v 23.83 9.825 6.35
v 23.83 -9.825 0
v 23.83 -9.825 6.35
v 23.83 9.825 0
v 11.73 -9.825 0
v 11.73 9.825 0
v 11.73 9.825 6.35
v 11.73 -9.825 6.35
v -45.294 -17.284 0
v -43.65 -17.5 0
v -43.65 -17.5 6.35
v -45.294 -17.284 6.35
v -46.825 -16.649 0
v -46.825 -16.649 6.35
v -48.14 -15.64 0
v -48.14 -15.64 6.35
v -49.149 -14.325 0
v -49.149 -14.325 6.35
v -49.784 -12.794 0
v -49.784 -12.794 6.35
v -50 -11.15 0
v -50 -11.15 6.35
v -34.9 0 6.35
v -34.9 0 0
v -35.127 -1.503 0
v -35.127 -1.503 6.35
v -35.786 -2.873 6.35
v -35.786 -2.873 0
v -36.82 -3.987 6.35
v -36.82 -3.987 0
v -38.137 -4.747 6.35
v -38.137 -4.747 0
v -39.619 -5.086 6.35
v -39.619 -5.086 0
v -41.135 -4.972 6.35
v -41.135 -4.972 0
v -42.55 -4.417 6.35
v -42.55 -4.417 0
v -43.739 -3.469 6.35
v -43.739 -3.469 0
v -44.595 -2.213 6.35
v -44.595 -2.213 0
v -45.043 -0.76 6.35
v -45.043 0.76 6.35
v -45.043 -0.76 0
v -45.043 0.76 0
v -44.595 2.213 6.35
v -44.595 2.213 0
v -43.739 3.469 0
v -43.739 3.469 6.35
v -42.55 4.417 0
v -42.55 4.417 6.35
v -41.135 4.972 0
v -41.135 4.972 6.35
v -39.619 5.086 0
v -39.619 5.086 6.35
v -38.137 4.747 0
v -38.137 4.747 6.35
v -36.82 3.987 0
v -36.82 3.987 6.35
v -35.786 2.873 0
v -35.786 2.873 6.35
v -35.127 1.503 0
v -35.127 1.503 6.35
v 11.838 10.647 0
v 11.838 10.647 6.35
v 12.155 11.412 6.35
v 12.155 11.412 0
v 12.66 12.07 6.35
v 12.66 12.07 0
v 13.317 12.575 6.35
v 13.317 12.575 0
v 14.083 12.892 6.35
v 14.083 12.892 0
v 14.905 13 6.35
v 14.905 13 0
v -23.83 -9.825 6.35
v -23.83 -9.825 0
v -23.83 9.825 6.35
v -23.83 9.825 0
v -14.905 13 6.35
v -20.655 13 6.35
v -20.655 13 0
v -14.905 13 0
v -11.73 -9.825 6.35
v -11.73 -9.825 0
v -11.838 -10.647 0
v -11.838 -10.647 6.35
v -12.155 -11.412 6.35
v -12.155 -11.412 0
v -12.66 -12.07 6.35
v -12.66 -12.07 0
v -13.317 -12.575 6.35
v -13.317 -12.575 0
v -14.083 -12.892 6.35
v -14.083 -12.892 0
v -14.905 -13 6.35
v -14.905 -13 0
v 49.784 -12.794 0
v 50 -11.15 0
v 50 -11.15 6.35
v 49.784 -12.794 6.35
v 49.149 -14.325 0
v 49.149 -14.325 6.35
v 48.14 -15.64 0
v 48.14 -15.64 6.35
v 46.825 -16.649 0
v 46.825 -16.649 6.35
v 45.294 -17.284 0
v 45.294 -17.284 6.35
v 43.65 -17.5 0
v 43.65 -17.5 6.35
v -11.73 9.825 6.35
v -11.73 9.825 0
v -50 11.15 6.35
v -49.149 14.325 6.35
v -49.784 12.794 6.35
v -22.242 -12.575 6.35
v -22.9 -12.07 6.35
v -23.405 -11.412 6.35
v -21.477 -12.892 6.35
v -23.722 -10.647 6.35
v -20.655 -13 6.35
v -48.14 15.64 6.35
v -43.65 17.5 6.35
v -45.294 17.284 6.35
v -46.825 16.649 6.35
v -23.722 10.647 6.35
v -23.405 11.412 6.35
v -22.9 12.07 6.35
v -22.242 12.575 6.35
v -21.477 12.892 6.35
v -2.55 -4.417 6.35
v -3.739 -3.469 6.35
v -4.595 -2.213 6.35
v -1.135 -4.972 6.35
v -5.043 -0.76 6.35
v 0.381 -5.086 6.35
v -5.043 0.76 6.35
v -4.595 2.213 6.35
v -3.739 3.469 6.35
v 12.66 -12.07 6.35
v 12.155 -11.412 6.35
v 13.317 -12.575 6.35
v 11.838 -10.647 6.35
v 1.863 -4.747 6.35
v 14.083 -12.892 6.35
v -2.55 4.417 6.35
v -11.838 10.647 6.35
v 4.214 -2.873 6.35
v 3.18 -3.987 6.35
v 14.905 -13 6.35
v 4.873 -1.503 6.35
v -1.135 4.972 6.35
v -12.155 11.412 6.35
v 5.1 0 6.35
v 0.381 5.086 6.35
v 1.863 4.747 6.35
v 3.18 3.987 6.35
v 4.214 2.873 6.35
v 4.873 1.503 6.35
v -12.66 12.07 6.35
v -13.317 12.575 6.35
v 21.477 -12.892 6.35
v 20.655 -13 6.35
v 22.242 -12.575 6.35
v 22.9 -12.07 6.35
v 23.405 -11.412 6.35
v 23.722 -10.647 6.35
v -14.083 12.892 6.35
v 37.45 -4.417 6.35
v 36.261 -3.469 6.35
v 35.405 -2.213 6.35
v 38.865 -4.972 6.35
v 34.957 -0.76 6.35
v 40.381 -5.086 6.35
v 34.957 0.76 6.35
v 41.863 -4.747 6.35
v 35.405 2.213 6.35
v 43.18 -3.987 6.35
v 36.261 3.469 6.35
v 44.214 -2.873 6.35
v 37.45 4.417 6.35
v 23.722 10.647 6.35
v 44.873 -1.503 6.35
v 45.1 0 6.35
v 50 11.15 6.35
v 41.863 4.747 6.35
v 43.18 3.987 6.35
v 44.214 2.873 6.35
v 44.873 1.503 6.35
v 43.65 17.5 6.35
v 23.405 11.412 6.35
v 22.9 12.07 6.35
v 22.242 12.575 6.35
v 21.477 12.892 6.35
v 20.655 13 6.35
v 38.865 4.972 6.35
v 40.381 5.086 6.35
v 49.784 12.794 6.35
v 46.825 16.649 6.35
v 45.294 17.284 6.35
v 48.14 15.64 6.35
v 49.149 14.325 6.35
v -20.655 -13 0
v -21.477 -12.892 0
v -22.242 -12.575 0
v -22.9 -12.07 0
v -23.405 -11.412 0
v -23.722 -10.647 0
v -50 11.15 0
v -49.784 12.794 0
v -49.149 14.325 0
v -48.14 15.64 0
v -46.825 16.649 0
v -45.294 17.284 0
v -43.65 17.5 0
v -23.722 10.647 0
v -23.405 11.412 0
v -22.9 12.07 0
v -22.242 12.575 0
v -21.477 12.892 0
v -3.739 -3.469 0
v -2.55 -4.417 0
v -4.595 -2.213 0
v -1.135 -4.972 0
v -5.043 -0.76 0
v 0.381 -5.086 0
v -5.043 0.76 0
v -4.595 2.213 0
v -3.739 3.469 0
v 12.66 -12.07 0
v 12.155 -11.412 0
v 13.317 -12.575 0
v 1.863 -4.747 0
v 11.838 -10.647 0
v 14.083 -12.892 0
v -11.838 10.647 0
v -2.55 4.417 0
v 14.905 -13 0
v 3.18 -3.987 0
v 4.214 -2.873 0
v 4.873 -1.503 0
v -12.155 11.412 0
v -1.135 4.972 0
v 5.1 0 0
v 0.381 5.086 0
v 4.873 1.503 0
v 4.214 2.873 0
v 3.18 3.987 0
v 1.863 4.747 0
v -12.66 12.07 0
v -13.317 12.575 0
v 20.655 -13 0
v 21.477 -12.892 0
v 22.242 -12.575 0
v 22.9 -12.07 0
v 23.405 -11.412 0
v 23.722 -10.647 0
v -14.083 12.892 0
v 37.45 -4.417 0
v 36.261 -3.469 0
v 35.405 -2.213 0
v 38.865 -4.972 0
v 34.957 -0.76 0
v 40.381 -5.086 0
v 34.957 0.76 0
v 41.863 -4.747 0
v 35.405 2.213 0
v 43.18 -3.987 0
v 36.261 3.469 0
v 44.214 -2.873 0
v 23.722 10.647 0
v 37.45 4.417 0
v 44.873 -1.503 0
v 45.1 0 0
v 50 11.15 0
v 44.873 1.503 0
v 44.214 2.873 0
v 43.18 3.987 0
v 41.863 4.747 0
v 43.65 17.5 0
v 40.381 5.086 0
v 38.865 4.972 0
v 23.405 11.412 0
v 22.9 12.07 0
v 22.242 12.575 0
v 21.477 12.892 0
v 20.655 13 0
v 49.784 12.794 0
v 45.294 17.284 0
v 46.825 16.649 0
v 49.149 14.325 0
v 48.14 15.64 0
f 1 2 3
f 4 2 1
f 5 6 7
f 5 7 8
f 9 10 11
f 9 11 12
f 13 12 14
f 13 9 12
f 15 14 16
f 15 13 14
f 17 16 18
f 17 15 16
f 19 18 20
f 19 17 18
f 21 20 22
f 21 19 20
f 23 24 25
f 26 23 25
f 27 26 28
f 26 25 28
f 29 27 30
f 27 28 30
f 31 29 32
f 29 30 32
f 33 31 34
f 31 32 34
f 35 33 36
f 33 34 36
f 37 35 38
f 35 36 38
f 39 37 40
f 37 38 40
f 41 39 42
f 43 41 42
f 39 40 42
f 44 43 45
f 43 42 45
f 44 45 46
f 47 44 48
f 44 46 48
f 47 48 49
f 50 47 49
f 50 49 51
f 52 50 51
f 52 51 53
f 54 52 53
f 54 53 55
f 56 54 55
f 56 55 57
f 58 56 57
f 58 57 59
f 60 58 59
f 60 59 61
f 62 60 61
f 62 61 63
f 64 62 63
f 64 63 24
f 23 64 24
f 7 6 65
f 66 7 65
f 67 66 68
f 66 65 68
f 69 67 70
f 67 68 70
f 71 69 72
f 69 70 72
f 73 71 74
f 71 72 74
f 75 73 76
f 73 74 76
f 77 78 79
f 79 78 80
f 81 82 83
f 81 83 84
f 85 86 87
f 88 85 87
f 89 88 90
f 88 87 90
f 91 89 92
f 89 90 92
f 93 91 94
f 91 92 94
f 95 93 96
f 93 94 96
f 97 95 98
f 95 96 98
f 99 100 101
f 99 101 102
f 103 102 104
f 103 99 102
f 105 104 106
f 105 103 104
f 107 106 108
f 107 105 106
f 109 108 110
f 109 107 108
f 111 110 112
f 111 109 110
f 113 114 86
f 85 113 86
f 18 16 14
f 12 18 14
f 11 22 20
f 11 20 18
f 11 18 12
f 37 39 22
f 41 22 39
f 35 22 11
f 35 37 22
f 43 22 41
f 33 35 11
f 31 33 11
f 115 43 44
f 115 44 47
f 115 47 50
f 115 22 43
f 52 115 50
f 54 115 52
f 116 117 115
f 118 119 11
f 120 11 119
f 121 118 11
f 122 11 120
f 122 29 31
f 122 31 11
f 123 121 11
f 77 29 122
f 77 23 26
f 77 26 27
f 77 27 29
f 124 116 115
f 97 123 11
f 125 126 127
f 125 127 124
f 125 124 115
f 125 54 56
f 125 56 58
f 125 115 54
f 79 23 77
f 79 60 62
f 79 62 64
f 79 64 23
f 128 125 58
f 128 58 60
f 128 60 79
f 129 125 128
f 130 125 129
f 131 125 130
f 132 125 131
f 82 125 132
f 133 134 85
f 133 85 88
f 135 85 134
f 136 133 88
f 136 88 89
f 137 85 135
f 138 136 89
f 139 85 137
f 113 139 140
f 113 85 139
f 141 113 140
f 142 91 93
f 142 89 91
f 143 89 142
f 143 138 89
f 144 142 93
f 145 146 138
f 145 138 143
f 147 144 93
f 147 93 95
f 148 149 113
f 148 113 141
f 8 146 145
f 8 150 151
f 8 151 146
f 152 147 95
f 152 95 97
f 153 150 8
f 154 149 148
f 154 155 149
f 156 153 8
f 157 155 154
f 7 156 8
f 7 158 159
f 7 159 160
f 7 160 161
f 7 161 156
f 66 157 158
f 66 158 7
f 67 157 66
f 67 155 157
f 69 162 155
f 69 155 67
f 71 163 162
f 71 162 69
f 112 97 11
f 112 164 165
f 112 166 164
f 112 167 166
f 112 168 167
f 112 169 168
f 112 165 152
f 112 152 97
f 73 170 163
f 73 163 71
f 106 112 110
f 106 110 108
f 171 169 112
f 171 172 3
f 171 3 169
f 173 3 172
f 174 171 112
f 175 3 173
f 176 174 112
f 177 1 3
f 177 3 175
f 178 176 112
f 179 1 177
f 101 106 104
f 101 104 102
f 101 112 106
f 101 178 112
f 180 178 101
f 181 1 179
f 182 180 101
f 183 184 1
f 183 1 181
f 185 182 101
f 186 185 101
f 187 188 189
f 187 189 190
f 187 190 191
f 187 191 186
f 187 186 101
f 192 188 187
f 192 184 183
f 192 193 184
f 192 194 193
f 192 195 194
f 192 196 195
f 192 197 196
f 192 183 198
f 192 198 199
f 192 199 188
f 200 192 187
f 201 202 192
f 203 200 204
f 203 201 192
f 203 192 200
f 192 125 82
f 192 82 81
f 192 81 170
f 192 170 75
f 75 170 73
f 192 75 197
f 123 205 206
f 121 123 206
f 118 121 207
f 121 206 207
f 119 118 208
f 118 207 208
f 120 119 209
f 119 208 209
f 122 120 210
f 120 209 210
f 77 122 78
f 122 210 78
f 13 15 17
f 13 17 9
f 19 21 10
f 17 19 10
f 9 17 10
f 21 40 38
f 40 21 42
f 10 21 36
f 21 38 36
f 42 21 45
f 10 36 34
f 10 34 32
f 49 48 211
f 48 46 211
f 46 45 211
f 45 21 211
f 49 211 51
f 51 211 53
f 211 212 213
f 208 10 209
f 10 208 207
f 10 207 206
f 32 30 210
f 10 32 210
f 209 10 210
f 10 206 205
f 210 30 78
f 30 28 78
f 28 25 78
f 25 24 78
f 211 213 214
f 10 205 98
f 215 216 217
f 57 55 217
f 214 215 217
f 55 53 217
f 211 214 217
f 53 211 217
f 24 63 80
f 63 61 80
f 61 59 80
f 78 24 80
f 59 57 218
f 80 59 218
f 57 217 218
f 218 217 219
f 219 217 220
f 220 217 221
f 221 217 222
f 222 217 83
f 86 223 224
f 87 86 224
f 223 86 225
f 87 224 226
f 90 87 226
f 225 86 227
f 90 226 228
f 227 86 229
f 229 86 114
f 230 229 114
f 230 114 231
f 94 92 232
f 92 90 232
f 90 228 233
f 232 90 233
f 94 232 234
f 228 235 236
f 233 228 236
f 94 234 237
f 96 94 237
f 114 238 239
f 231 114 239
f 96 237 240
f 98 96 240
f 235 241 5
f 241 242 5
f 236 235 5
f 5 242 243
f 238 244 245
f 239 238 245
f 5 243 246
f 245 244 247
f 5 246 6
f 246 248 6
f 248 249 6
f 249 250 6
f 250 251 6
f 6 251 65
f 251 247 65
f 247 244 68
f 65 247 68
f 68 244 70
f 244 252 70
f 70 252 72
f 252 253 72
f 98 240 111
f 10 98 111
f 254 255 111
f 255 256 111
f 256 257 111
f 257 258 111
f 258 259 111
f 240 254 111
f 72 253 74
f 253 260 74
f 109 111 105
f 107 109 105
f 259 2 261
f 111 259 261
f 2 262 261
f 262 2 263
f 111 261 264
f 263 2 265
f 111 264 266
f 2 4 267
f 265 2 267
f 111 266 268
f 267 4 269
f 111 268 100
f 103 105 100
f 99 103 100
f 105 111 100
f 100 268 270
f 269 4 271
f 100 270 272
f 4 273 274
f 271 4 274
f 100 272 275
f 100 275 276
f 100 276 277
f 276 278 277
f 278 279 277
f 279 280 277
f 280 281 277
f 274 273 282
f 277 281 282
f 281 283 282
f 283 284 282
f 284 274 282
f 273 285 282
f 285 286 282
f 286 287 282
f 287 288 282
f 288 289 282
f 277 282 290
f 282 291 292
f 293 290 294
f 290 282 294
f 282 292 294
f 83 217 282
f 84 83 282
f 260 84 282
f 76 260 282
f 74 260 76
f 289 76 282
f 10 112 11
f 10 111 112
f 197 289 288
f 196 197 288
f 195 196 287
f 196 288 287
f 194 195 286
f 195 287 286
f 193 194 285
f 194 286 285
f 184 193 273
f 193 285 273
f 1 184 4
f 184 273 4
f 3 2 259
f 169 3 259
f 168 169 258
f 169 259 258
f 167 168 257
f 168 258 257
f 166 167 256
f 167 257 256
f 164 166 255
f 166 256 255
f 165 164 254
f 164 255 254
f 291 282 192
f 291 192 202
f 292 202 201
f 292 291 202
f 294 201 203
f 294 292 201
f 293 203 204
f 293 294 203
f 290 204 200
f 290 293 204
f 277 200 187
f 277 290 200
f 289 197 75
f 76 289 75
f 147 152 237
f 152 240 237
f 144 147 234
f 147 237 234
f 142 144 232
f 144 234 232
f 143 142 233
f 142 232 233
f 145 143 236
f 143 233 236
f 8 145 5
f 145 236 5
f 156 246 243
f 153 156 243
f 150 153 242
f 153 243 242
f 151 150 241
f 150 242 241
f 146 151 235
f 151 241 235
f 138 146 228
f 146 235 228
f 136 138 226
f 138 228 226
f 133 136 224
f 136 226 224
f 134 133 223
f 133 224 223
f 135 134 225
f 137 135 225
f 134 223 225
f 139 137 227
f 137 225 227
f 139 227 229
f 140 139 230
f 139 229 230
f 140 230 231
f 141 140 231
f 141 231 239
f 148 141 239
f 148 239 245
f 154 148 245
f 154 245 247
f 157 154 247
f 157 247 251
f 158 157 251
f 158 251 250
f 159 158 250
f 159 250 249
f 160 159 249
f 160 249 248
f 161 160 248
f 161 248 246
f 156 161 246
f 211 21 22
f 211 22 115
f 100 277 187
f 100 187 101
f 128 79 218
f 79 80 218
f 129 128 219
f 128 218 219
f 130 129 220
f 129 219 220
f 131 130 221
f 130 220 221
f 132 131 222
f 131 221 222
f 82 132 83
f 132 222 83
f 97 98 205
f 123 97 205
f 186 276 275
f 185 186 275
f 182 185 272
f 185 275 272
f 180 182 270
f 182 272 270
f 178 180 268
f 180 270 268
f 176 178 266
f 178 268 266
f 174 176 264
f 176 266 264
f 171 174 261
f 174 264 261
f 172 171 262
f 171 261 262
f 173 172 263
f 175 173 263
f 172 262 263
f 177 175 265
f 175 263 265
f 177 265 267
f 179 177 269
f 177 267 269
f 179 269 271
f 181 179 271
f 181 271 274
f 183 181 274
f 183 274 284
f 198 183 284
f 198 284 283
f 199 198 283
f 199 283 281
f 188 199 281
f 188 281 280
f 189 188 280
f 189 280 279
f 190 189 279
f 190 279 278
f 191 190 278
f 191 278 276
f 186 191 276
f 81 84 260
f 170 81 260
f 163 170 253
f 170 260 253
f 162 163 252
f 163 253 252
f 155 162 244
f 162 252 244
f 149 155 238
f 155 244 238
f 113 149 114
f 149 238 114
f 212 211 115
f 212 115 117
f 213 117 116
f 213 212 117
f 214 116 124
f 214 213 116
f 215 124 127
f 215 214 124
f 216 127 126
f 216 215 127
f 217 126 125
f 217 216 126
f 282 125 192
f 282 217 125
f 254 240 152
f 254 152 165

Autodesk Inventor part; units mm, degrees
ref_plane "YZ Plane" through (0, 0, 0) normal (1, 0, 0) x (0, 1, 0)
ref_plane "XZ Plane" through (0, 0, 0) normal (0, 1, 0) x (-1, 0, 0)
ref_plane "XY Plane" through (0, 0, 0) normal (0, 0, 1) x (1, 0, 0)
sketch "Sketch1" plane through (0, 0, 0) normal (0, 0, 1) x (1, 0, 0)
  line L0 (43.65, -17.5) -> (-43.65, -17.5)
  line L1 (-50, -11.15) -> (-50, 11.15)
  line L2 (-43.65, 17.5) -> (43.65, 17.5)
  line L3 (50, 11.15) -> (50, -11.15)
  line L4 (50, -17.5) -> (-50, 17.5) construction
  line L5 (-50, -17.5) -> (50, 17.5) construction
  line L6 (0, 51.2558) -> (0, -45.9758)
  circle A0 centre (-40, 0) radius 5.1
  line L7 (-83.6339, 0) -> (65.0593, 0)
  circle A1 centre (40, 0) radius 5.1
  circle A2 centre (0, 0) radius 5.1
  arc A3 (-43.65, 17.5) -> (-50, 11.15) centre (-43.65, 11.15) ccw
  arc A4 (-50, -11.15) -> (-43.65, -17.5) centre (-43.65, -11.15) ccw
  arc A5 (43.65, -17.5) -> (50, -11.15) centre (43.65, -11.15) ccw
  arc A6 (50, 11.15) -> (43.65, 17.5) centre (43.65, 11.15) ccw
  line L8 (-14.905, -13) -> (-20.655, -13)
  line L9 (-23.83, -9.825) -> (-23.83, 9.825)
  line L10 (-20.655, 13) -> (-14.905, 13)
  line L11 (-11.73, 9.825) -> (-11.73, -9.825)
  line L12 (-11.73, -13) -> (-23.83, 13) construction
  line L13 (-23.83, -13) -> (-11.73, 13) construction
  line L14 (14.905, -13) -> (20.655, -13)
  line L15 (23.83, -9.825) -> (23.83, 9.825)
  line L16 (20.655, 13) -> (14.905, 13)
  line L17 (11.73, 9.825) -> (11.73, -9.825)
  line L18 (11.73, -13) -> (23.83, 13) construction
  line L19 (23.83, -13) -> (11.73, 13) construction
  arc A7 (-20.655, 13) -> (-23.83, 9.825) centre (-20.655, 9.825) ccw
  arc A8 (-11.73, 9.825) -> (-14.905, 13) centre (-14.905, 9.825) ccw
  arc A9 (-14.905, -13) -> (-11.73, -9.825) centre (-14.905, -9.825) ccw
  arc A10 (-23.83, -9.825) -> (-20.655, -13) centre (-20.655, -9.825) ccw
  arc A11 (11.73, -9.825) -> (14.905, -13) centre (14.905, -9.825) ccw
  arc A12 (20.655, -13) -> (23.83, -9.825) centre (20.655, -9.825) ccw
  arc A13 (23.83, 9.825) -> (20.655, 13) centre (20.655, 9.825) ccw
  arc A14 (14.905, 13) -> (11.73, 9.825) centre (14.905, 9.825) ccw
  point P0 (0, 0)
  point P1 (0, 0)
  point P2 (-17.78, 0)
  point P3 (17.78, 0)
  dimension "d0" = 100
  dimension "d1" = 35
  dimension "d2" = 80
  dimension "d3" = 10.2
  dimension "d6" = 10.2
  dimension "d7" = 6.35
  dimension "d8" = 26
  dimension "d9" = 12.1
  dimension "d10" = 3.175
  dimension "d11" = 35.56
extrude "Extrusion1" add sketch "Sketch1" along normal blind 6.35 contours L0 L6 A2 L7 L17 A11 L14 A12 L15 A1 L3 A5 | L0 A4 L1 L7 A0 L9 A10 L8 A9 L11 A2 L6 | L7 A1 L15 A13 L16 A14 L17 A2 L6 L2 A6 L3 | L7 L11 A8 L10 A7 L9 A0 L1 A3 L2 L6 A2
equation "\"d6\" = d3"
properties part number "Vertical_Lead_Screw_E-stop_Plate"
